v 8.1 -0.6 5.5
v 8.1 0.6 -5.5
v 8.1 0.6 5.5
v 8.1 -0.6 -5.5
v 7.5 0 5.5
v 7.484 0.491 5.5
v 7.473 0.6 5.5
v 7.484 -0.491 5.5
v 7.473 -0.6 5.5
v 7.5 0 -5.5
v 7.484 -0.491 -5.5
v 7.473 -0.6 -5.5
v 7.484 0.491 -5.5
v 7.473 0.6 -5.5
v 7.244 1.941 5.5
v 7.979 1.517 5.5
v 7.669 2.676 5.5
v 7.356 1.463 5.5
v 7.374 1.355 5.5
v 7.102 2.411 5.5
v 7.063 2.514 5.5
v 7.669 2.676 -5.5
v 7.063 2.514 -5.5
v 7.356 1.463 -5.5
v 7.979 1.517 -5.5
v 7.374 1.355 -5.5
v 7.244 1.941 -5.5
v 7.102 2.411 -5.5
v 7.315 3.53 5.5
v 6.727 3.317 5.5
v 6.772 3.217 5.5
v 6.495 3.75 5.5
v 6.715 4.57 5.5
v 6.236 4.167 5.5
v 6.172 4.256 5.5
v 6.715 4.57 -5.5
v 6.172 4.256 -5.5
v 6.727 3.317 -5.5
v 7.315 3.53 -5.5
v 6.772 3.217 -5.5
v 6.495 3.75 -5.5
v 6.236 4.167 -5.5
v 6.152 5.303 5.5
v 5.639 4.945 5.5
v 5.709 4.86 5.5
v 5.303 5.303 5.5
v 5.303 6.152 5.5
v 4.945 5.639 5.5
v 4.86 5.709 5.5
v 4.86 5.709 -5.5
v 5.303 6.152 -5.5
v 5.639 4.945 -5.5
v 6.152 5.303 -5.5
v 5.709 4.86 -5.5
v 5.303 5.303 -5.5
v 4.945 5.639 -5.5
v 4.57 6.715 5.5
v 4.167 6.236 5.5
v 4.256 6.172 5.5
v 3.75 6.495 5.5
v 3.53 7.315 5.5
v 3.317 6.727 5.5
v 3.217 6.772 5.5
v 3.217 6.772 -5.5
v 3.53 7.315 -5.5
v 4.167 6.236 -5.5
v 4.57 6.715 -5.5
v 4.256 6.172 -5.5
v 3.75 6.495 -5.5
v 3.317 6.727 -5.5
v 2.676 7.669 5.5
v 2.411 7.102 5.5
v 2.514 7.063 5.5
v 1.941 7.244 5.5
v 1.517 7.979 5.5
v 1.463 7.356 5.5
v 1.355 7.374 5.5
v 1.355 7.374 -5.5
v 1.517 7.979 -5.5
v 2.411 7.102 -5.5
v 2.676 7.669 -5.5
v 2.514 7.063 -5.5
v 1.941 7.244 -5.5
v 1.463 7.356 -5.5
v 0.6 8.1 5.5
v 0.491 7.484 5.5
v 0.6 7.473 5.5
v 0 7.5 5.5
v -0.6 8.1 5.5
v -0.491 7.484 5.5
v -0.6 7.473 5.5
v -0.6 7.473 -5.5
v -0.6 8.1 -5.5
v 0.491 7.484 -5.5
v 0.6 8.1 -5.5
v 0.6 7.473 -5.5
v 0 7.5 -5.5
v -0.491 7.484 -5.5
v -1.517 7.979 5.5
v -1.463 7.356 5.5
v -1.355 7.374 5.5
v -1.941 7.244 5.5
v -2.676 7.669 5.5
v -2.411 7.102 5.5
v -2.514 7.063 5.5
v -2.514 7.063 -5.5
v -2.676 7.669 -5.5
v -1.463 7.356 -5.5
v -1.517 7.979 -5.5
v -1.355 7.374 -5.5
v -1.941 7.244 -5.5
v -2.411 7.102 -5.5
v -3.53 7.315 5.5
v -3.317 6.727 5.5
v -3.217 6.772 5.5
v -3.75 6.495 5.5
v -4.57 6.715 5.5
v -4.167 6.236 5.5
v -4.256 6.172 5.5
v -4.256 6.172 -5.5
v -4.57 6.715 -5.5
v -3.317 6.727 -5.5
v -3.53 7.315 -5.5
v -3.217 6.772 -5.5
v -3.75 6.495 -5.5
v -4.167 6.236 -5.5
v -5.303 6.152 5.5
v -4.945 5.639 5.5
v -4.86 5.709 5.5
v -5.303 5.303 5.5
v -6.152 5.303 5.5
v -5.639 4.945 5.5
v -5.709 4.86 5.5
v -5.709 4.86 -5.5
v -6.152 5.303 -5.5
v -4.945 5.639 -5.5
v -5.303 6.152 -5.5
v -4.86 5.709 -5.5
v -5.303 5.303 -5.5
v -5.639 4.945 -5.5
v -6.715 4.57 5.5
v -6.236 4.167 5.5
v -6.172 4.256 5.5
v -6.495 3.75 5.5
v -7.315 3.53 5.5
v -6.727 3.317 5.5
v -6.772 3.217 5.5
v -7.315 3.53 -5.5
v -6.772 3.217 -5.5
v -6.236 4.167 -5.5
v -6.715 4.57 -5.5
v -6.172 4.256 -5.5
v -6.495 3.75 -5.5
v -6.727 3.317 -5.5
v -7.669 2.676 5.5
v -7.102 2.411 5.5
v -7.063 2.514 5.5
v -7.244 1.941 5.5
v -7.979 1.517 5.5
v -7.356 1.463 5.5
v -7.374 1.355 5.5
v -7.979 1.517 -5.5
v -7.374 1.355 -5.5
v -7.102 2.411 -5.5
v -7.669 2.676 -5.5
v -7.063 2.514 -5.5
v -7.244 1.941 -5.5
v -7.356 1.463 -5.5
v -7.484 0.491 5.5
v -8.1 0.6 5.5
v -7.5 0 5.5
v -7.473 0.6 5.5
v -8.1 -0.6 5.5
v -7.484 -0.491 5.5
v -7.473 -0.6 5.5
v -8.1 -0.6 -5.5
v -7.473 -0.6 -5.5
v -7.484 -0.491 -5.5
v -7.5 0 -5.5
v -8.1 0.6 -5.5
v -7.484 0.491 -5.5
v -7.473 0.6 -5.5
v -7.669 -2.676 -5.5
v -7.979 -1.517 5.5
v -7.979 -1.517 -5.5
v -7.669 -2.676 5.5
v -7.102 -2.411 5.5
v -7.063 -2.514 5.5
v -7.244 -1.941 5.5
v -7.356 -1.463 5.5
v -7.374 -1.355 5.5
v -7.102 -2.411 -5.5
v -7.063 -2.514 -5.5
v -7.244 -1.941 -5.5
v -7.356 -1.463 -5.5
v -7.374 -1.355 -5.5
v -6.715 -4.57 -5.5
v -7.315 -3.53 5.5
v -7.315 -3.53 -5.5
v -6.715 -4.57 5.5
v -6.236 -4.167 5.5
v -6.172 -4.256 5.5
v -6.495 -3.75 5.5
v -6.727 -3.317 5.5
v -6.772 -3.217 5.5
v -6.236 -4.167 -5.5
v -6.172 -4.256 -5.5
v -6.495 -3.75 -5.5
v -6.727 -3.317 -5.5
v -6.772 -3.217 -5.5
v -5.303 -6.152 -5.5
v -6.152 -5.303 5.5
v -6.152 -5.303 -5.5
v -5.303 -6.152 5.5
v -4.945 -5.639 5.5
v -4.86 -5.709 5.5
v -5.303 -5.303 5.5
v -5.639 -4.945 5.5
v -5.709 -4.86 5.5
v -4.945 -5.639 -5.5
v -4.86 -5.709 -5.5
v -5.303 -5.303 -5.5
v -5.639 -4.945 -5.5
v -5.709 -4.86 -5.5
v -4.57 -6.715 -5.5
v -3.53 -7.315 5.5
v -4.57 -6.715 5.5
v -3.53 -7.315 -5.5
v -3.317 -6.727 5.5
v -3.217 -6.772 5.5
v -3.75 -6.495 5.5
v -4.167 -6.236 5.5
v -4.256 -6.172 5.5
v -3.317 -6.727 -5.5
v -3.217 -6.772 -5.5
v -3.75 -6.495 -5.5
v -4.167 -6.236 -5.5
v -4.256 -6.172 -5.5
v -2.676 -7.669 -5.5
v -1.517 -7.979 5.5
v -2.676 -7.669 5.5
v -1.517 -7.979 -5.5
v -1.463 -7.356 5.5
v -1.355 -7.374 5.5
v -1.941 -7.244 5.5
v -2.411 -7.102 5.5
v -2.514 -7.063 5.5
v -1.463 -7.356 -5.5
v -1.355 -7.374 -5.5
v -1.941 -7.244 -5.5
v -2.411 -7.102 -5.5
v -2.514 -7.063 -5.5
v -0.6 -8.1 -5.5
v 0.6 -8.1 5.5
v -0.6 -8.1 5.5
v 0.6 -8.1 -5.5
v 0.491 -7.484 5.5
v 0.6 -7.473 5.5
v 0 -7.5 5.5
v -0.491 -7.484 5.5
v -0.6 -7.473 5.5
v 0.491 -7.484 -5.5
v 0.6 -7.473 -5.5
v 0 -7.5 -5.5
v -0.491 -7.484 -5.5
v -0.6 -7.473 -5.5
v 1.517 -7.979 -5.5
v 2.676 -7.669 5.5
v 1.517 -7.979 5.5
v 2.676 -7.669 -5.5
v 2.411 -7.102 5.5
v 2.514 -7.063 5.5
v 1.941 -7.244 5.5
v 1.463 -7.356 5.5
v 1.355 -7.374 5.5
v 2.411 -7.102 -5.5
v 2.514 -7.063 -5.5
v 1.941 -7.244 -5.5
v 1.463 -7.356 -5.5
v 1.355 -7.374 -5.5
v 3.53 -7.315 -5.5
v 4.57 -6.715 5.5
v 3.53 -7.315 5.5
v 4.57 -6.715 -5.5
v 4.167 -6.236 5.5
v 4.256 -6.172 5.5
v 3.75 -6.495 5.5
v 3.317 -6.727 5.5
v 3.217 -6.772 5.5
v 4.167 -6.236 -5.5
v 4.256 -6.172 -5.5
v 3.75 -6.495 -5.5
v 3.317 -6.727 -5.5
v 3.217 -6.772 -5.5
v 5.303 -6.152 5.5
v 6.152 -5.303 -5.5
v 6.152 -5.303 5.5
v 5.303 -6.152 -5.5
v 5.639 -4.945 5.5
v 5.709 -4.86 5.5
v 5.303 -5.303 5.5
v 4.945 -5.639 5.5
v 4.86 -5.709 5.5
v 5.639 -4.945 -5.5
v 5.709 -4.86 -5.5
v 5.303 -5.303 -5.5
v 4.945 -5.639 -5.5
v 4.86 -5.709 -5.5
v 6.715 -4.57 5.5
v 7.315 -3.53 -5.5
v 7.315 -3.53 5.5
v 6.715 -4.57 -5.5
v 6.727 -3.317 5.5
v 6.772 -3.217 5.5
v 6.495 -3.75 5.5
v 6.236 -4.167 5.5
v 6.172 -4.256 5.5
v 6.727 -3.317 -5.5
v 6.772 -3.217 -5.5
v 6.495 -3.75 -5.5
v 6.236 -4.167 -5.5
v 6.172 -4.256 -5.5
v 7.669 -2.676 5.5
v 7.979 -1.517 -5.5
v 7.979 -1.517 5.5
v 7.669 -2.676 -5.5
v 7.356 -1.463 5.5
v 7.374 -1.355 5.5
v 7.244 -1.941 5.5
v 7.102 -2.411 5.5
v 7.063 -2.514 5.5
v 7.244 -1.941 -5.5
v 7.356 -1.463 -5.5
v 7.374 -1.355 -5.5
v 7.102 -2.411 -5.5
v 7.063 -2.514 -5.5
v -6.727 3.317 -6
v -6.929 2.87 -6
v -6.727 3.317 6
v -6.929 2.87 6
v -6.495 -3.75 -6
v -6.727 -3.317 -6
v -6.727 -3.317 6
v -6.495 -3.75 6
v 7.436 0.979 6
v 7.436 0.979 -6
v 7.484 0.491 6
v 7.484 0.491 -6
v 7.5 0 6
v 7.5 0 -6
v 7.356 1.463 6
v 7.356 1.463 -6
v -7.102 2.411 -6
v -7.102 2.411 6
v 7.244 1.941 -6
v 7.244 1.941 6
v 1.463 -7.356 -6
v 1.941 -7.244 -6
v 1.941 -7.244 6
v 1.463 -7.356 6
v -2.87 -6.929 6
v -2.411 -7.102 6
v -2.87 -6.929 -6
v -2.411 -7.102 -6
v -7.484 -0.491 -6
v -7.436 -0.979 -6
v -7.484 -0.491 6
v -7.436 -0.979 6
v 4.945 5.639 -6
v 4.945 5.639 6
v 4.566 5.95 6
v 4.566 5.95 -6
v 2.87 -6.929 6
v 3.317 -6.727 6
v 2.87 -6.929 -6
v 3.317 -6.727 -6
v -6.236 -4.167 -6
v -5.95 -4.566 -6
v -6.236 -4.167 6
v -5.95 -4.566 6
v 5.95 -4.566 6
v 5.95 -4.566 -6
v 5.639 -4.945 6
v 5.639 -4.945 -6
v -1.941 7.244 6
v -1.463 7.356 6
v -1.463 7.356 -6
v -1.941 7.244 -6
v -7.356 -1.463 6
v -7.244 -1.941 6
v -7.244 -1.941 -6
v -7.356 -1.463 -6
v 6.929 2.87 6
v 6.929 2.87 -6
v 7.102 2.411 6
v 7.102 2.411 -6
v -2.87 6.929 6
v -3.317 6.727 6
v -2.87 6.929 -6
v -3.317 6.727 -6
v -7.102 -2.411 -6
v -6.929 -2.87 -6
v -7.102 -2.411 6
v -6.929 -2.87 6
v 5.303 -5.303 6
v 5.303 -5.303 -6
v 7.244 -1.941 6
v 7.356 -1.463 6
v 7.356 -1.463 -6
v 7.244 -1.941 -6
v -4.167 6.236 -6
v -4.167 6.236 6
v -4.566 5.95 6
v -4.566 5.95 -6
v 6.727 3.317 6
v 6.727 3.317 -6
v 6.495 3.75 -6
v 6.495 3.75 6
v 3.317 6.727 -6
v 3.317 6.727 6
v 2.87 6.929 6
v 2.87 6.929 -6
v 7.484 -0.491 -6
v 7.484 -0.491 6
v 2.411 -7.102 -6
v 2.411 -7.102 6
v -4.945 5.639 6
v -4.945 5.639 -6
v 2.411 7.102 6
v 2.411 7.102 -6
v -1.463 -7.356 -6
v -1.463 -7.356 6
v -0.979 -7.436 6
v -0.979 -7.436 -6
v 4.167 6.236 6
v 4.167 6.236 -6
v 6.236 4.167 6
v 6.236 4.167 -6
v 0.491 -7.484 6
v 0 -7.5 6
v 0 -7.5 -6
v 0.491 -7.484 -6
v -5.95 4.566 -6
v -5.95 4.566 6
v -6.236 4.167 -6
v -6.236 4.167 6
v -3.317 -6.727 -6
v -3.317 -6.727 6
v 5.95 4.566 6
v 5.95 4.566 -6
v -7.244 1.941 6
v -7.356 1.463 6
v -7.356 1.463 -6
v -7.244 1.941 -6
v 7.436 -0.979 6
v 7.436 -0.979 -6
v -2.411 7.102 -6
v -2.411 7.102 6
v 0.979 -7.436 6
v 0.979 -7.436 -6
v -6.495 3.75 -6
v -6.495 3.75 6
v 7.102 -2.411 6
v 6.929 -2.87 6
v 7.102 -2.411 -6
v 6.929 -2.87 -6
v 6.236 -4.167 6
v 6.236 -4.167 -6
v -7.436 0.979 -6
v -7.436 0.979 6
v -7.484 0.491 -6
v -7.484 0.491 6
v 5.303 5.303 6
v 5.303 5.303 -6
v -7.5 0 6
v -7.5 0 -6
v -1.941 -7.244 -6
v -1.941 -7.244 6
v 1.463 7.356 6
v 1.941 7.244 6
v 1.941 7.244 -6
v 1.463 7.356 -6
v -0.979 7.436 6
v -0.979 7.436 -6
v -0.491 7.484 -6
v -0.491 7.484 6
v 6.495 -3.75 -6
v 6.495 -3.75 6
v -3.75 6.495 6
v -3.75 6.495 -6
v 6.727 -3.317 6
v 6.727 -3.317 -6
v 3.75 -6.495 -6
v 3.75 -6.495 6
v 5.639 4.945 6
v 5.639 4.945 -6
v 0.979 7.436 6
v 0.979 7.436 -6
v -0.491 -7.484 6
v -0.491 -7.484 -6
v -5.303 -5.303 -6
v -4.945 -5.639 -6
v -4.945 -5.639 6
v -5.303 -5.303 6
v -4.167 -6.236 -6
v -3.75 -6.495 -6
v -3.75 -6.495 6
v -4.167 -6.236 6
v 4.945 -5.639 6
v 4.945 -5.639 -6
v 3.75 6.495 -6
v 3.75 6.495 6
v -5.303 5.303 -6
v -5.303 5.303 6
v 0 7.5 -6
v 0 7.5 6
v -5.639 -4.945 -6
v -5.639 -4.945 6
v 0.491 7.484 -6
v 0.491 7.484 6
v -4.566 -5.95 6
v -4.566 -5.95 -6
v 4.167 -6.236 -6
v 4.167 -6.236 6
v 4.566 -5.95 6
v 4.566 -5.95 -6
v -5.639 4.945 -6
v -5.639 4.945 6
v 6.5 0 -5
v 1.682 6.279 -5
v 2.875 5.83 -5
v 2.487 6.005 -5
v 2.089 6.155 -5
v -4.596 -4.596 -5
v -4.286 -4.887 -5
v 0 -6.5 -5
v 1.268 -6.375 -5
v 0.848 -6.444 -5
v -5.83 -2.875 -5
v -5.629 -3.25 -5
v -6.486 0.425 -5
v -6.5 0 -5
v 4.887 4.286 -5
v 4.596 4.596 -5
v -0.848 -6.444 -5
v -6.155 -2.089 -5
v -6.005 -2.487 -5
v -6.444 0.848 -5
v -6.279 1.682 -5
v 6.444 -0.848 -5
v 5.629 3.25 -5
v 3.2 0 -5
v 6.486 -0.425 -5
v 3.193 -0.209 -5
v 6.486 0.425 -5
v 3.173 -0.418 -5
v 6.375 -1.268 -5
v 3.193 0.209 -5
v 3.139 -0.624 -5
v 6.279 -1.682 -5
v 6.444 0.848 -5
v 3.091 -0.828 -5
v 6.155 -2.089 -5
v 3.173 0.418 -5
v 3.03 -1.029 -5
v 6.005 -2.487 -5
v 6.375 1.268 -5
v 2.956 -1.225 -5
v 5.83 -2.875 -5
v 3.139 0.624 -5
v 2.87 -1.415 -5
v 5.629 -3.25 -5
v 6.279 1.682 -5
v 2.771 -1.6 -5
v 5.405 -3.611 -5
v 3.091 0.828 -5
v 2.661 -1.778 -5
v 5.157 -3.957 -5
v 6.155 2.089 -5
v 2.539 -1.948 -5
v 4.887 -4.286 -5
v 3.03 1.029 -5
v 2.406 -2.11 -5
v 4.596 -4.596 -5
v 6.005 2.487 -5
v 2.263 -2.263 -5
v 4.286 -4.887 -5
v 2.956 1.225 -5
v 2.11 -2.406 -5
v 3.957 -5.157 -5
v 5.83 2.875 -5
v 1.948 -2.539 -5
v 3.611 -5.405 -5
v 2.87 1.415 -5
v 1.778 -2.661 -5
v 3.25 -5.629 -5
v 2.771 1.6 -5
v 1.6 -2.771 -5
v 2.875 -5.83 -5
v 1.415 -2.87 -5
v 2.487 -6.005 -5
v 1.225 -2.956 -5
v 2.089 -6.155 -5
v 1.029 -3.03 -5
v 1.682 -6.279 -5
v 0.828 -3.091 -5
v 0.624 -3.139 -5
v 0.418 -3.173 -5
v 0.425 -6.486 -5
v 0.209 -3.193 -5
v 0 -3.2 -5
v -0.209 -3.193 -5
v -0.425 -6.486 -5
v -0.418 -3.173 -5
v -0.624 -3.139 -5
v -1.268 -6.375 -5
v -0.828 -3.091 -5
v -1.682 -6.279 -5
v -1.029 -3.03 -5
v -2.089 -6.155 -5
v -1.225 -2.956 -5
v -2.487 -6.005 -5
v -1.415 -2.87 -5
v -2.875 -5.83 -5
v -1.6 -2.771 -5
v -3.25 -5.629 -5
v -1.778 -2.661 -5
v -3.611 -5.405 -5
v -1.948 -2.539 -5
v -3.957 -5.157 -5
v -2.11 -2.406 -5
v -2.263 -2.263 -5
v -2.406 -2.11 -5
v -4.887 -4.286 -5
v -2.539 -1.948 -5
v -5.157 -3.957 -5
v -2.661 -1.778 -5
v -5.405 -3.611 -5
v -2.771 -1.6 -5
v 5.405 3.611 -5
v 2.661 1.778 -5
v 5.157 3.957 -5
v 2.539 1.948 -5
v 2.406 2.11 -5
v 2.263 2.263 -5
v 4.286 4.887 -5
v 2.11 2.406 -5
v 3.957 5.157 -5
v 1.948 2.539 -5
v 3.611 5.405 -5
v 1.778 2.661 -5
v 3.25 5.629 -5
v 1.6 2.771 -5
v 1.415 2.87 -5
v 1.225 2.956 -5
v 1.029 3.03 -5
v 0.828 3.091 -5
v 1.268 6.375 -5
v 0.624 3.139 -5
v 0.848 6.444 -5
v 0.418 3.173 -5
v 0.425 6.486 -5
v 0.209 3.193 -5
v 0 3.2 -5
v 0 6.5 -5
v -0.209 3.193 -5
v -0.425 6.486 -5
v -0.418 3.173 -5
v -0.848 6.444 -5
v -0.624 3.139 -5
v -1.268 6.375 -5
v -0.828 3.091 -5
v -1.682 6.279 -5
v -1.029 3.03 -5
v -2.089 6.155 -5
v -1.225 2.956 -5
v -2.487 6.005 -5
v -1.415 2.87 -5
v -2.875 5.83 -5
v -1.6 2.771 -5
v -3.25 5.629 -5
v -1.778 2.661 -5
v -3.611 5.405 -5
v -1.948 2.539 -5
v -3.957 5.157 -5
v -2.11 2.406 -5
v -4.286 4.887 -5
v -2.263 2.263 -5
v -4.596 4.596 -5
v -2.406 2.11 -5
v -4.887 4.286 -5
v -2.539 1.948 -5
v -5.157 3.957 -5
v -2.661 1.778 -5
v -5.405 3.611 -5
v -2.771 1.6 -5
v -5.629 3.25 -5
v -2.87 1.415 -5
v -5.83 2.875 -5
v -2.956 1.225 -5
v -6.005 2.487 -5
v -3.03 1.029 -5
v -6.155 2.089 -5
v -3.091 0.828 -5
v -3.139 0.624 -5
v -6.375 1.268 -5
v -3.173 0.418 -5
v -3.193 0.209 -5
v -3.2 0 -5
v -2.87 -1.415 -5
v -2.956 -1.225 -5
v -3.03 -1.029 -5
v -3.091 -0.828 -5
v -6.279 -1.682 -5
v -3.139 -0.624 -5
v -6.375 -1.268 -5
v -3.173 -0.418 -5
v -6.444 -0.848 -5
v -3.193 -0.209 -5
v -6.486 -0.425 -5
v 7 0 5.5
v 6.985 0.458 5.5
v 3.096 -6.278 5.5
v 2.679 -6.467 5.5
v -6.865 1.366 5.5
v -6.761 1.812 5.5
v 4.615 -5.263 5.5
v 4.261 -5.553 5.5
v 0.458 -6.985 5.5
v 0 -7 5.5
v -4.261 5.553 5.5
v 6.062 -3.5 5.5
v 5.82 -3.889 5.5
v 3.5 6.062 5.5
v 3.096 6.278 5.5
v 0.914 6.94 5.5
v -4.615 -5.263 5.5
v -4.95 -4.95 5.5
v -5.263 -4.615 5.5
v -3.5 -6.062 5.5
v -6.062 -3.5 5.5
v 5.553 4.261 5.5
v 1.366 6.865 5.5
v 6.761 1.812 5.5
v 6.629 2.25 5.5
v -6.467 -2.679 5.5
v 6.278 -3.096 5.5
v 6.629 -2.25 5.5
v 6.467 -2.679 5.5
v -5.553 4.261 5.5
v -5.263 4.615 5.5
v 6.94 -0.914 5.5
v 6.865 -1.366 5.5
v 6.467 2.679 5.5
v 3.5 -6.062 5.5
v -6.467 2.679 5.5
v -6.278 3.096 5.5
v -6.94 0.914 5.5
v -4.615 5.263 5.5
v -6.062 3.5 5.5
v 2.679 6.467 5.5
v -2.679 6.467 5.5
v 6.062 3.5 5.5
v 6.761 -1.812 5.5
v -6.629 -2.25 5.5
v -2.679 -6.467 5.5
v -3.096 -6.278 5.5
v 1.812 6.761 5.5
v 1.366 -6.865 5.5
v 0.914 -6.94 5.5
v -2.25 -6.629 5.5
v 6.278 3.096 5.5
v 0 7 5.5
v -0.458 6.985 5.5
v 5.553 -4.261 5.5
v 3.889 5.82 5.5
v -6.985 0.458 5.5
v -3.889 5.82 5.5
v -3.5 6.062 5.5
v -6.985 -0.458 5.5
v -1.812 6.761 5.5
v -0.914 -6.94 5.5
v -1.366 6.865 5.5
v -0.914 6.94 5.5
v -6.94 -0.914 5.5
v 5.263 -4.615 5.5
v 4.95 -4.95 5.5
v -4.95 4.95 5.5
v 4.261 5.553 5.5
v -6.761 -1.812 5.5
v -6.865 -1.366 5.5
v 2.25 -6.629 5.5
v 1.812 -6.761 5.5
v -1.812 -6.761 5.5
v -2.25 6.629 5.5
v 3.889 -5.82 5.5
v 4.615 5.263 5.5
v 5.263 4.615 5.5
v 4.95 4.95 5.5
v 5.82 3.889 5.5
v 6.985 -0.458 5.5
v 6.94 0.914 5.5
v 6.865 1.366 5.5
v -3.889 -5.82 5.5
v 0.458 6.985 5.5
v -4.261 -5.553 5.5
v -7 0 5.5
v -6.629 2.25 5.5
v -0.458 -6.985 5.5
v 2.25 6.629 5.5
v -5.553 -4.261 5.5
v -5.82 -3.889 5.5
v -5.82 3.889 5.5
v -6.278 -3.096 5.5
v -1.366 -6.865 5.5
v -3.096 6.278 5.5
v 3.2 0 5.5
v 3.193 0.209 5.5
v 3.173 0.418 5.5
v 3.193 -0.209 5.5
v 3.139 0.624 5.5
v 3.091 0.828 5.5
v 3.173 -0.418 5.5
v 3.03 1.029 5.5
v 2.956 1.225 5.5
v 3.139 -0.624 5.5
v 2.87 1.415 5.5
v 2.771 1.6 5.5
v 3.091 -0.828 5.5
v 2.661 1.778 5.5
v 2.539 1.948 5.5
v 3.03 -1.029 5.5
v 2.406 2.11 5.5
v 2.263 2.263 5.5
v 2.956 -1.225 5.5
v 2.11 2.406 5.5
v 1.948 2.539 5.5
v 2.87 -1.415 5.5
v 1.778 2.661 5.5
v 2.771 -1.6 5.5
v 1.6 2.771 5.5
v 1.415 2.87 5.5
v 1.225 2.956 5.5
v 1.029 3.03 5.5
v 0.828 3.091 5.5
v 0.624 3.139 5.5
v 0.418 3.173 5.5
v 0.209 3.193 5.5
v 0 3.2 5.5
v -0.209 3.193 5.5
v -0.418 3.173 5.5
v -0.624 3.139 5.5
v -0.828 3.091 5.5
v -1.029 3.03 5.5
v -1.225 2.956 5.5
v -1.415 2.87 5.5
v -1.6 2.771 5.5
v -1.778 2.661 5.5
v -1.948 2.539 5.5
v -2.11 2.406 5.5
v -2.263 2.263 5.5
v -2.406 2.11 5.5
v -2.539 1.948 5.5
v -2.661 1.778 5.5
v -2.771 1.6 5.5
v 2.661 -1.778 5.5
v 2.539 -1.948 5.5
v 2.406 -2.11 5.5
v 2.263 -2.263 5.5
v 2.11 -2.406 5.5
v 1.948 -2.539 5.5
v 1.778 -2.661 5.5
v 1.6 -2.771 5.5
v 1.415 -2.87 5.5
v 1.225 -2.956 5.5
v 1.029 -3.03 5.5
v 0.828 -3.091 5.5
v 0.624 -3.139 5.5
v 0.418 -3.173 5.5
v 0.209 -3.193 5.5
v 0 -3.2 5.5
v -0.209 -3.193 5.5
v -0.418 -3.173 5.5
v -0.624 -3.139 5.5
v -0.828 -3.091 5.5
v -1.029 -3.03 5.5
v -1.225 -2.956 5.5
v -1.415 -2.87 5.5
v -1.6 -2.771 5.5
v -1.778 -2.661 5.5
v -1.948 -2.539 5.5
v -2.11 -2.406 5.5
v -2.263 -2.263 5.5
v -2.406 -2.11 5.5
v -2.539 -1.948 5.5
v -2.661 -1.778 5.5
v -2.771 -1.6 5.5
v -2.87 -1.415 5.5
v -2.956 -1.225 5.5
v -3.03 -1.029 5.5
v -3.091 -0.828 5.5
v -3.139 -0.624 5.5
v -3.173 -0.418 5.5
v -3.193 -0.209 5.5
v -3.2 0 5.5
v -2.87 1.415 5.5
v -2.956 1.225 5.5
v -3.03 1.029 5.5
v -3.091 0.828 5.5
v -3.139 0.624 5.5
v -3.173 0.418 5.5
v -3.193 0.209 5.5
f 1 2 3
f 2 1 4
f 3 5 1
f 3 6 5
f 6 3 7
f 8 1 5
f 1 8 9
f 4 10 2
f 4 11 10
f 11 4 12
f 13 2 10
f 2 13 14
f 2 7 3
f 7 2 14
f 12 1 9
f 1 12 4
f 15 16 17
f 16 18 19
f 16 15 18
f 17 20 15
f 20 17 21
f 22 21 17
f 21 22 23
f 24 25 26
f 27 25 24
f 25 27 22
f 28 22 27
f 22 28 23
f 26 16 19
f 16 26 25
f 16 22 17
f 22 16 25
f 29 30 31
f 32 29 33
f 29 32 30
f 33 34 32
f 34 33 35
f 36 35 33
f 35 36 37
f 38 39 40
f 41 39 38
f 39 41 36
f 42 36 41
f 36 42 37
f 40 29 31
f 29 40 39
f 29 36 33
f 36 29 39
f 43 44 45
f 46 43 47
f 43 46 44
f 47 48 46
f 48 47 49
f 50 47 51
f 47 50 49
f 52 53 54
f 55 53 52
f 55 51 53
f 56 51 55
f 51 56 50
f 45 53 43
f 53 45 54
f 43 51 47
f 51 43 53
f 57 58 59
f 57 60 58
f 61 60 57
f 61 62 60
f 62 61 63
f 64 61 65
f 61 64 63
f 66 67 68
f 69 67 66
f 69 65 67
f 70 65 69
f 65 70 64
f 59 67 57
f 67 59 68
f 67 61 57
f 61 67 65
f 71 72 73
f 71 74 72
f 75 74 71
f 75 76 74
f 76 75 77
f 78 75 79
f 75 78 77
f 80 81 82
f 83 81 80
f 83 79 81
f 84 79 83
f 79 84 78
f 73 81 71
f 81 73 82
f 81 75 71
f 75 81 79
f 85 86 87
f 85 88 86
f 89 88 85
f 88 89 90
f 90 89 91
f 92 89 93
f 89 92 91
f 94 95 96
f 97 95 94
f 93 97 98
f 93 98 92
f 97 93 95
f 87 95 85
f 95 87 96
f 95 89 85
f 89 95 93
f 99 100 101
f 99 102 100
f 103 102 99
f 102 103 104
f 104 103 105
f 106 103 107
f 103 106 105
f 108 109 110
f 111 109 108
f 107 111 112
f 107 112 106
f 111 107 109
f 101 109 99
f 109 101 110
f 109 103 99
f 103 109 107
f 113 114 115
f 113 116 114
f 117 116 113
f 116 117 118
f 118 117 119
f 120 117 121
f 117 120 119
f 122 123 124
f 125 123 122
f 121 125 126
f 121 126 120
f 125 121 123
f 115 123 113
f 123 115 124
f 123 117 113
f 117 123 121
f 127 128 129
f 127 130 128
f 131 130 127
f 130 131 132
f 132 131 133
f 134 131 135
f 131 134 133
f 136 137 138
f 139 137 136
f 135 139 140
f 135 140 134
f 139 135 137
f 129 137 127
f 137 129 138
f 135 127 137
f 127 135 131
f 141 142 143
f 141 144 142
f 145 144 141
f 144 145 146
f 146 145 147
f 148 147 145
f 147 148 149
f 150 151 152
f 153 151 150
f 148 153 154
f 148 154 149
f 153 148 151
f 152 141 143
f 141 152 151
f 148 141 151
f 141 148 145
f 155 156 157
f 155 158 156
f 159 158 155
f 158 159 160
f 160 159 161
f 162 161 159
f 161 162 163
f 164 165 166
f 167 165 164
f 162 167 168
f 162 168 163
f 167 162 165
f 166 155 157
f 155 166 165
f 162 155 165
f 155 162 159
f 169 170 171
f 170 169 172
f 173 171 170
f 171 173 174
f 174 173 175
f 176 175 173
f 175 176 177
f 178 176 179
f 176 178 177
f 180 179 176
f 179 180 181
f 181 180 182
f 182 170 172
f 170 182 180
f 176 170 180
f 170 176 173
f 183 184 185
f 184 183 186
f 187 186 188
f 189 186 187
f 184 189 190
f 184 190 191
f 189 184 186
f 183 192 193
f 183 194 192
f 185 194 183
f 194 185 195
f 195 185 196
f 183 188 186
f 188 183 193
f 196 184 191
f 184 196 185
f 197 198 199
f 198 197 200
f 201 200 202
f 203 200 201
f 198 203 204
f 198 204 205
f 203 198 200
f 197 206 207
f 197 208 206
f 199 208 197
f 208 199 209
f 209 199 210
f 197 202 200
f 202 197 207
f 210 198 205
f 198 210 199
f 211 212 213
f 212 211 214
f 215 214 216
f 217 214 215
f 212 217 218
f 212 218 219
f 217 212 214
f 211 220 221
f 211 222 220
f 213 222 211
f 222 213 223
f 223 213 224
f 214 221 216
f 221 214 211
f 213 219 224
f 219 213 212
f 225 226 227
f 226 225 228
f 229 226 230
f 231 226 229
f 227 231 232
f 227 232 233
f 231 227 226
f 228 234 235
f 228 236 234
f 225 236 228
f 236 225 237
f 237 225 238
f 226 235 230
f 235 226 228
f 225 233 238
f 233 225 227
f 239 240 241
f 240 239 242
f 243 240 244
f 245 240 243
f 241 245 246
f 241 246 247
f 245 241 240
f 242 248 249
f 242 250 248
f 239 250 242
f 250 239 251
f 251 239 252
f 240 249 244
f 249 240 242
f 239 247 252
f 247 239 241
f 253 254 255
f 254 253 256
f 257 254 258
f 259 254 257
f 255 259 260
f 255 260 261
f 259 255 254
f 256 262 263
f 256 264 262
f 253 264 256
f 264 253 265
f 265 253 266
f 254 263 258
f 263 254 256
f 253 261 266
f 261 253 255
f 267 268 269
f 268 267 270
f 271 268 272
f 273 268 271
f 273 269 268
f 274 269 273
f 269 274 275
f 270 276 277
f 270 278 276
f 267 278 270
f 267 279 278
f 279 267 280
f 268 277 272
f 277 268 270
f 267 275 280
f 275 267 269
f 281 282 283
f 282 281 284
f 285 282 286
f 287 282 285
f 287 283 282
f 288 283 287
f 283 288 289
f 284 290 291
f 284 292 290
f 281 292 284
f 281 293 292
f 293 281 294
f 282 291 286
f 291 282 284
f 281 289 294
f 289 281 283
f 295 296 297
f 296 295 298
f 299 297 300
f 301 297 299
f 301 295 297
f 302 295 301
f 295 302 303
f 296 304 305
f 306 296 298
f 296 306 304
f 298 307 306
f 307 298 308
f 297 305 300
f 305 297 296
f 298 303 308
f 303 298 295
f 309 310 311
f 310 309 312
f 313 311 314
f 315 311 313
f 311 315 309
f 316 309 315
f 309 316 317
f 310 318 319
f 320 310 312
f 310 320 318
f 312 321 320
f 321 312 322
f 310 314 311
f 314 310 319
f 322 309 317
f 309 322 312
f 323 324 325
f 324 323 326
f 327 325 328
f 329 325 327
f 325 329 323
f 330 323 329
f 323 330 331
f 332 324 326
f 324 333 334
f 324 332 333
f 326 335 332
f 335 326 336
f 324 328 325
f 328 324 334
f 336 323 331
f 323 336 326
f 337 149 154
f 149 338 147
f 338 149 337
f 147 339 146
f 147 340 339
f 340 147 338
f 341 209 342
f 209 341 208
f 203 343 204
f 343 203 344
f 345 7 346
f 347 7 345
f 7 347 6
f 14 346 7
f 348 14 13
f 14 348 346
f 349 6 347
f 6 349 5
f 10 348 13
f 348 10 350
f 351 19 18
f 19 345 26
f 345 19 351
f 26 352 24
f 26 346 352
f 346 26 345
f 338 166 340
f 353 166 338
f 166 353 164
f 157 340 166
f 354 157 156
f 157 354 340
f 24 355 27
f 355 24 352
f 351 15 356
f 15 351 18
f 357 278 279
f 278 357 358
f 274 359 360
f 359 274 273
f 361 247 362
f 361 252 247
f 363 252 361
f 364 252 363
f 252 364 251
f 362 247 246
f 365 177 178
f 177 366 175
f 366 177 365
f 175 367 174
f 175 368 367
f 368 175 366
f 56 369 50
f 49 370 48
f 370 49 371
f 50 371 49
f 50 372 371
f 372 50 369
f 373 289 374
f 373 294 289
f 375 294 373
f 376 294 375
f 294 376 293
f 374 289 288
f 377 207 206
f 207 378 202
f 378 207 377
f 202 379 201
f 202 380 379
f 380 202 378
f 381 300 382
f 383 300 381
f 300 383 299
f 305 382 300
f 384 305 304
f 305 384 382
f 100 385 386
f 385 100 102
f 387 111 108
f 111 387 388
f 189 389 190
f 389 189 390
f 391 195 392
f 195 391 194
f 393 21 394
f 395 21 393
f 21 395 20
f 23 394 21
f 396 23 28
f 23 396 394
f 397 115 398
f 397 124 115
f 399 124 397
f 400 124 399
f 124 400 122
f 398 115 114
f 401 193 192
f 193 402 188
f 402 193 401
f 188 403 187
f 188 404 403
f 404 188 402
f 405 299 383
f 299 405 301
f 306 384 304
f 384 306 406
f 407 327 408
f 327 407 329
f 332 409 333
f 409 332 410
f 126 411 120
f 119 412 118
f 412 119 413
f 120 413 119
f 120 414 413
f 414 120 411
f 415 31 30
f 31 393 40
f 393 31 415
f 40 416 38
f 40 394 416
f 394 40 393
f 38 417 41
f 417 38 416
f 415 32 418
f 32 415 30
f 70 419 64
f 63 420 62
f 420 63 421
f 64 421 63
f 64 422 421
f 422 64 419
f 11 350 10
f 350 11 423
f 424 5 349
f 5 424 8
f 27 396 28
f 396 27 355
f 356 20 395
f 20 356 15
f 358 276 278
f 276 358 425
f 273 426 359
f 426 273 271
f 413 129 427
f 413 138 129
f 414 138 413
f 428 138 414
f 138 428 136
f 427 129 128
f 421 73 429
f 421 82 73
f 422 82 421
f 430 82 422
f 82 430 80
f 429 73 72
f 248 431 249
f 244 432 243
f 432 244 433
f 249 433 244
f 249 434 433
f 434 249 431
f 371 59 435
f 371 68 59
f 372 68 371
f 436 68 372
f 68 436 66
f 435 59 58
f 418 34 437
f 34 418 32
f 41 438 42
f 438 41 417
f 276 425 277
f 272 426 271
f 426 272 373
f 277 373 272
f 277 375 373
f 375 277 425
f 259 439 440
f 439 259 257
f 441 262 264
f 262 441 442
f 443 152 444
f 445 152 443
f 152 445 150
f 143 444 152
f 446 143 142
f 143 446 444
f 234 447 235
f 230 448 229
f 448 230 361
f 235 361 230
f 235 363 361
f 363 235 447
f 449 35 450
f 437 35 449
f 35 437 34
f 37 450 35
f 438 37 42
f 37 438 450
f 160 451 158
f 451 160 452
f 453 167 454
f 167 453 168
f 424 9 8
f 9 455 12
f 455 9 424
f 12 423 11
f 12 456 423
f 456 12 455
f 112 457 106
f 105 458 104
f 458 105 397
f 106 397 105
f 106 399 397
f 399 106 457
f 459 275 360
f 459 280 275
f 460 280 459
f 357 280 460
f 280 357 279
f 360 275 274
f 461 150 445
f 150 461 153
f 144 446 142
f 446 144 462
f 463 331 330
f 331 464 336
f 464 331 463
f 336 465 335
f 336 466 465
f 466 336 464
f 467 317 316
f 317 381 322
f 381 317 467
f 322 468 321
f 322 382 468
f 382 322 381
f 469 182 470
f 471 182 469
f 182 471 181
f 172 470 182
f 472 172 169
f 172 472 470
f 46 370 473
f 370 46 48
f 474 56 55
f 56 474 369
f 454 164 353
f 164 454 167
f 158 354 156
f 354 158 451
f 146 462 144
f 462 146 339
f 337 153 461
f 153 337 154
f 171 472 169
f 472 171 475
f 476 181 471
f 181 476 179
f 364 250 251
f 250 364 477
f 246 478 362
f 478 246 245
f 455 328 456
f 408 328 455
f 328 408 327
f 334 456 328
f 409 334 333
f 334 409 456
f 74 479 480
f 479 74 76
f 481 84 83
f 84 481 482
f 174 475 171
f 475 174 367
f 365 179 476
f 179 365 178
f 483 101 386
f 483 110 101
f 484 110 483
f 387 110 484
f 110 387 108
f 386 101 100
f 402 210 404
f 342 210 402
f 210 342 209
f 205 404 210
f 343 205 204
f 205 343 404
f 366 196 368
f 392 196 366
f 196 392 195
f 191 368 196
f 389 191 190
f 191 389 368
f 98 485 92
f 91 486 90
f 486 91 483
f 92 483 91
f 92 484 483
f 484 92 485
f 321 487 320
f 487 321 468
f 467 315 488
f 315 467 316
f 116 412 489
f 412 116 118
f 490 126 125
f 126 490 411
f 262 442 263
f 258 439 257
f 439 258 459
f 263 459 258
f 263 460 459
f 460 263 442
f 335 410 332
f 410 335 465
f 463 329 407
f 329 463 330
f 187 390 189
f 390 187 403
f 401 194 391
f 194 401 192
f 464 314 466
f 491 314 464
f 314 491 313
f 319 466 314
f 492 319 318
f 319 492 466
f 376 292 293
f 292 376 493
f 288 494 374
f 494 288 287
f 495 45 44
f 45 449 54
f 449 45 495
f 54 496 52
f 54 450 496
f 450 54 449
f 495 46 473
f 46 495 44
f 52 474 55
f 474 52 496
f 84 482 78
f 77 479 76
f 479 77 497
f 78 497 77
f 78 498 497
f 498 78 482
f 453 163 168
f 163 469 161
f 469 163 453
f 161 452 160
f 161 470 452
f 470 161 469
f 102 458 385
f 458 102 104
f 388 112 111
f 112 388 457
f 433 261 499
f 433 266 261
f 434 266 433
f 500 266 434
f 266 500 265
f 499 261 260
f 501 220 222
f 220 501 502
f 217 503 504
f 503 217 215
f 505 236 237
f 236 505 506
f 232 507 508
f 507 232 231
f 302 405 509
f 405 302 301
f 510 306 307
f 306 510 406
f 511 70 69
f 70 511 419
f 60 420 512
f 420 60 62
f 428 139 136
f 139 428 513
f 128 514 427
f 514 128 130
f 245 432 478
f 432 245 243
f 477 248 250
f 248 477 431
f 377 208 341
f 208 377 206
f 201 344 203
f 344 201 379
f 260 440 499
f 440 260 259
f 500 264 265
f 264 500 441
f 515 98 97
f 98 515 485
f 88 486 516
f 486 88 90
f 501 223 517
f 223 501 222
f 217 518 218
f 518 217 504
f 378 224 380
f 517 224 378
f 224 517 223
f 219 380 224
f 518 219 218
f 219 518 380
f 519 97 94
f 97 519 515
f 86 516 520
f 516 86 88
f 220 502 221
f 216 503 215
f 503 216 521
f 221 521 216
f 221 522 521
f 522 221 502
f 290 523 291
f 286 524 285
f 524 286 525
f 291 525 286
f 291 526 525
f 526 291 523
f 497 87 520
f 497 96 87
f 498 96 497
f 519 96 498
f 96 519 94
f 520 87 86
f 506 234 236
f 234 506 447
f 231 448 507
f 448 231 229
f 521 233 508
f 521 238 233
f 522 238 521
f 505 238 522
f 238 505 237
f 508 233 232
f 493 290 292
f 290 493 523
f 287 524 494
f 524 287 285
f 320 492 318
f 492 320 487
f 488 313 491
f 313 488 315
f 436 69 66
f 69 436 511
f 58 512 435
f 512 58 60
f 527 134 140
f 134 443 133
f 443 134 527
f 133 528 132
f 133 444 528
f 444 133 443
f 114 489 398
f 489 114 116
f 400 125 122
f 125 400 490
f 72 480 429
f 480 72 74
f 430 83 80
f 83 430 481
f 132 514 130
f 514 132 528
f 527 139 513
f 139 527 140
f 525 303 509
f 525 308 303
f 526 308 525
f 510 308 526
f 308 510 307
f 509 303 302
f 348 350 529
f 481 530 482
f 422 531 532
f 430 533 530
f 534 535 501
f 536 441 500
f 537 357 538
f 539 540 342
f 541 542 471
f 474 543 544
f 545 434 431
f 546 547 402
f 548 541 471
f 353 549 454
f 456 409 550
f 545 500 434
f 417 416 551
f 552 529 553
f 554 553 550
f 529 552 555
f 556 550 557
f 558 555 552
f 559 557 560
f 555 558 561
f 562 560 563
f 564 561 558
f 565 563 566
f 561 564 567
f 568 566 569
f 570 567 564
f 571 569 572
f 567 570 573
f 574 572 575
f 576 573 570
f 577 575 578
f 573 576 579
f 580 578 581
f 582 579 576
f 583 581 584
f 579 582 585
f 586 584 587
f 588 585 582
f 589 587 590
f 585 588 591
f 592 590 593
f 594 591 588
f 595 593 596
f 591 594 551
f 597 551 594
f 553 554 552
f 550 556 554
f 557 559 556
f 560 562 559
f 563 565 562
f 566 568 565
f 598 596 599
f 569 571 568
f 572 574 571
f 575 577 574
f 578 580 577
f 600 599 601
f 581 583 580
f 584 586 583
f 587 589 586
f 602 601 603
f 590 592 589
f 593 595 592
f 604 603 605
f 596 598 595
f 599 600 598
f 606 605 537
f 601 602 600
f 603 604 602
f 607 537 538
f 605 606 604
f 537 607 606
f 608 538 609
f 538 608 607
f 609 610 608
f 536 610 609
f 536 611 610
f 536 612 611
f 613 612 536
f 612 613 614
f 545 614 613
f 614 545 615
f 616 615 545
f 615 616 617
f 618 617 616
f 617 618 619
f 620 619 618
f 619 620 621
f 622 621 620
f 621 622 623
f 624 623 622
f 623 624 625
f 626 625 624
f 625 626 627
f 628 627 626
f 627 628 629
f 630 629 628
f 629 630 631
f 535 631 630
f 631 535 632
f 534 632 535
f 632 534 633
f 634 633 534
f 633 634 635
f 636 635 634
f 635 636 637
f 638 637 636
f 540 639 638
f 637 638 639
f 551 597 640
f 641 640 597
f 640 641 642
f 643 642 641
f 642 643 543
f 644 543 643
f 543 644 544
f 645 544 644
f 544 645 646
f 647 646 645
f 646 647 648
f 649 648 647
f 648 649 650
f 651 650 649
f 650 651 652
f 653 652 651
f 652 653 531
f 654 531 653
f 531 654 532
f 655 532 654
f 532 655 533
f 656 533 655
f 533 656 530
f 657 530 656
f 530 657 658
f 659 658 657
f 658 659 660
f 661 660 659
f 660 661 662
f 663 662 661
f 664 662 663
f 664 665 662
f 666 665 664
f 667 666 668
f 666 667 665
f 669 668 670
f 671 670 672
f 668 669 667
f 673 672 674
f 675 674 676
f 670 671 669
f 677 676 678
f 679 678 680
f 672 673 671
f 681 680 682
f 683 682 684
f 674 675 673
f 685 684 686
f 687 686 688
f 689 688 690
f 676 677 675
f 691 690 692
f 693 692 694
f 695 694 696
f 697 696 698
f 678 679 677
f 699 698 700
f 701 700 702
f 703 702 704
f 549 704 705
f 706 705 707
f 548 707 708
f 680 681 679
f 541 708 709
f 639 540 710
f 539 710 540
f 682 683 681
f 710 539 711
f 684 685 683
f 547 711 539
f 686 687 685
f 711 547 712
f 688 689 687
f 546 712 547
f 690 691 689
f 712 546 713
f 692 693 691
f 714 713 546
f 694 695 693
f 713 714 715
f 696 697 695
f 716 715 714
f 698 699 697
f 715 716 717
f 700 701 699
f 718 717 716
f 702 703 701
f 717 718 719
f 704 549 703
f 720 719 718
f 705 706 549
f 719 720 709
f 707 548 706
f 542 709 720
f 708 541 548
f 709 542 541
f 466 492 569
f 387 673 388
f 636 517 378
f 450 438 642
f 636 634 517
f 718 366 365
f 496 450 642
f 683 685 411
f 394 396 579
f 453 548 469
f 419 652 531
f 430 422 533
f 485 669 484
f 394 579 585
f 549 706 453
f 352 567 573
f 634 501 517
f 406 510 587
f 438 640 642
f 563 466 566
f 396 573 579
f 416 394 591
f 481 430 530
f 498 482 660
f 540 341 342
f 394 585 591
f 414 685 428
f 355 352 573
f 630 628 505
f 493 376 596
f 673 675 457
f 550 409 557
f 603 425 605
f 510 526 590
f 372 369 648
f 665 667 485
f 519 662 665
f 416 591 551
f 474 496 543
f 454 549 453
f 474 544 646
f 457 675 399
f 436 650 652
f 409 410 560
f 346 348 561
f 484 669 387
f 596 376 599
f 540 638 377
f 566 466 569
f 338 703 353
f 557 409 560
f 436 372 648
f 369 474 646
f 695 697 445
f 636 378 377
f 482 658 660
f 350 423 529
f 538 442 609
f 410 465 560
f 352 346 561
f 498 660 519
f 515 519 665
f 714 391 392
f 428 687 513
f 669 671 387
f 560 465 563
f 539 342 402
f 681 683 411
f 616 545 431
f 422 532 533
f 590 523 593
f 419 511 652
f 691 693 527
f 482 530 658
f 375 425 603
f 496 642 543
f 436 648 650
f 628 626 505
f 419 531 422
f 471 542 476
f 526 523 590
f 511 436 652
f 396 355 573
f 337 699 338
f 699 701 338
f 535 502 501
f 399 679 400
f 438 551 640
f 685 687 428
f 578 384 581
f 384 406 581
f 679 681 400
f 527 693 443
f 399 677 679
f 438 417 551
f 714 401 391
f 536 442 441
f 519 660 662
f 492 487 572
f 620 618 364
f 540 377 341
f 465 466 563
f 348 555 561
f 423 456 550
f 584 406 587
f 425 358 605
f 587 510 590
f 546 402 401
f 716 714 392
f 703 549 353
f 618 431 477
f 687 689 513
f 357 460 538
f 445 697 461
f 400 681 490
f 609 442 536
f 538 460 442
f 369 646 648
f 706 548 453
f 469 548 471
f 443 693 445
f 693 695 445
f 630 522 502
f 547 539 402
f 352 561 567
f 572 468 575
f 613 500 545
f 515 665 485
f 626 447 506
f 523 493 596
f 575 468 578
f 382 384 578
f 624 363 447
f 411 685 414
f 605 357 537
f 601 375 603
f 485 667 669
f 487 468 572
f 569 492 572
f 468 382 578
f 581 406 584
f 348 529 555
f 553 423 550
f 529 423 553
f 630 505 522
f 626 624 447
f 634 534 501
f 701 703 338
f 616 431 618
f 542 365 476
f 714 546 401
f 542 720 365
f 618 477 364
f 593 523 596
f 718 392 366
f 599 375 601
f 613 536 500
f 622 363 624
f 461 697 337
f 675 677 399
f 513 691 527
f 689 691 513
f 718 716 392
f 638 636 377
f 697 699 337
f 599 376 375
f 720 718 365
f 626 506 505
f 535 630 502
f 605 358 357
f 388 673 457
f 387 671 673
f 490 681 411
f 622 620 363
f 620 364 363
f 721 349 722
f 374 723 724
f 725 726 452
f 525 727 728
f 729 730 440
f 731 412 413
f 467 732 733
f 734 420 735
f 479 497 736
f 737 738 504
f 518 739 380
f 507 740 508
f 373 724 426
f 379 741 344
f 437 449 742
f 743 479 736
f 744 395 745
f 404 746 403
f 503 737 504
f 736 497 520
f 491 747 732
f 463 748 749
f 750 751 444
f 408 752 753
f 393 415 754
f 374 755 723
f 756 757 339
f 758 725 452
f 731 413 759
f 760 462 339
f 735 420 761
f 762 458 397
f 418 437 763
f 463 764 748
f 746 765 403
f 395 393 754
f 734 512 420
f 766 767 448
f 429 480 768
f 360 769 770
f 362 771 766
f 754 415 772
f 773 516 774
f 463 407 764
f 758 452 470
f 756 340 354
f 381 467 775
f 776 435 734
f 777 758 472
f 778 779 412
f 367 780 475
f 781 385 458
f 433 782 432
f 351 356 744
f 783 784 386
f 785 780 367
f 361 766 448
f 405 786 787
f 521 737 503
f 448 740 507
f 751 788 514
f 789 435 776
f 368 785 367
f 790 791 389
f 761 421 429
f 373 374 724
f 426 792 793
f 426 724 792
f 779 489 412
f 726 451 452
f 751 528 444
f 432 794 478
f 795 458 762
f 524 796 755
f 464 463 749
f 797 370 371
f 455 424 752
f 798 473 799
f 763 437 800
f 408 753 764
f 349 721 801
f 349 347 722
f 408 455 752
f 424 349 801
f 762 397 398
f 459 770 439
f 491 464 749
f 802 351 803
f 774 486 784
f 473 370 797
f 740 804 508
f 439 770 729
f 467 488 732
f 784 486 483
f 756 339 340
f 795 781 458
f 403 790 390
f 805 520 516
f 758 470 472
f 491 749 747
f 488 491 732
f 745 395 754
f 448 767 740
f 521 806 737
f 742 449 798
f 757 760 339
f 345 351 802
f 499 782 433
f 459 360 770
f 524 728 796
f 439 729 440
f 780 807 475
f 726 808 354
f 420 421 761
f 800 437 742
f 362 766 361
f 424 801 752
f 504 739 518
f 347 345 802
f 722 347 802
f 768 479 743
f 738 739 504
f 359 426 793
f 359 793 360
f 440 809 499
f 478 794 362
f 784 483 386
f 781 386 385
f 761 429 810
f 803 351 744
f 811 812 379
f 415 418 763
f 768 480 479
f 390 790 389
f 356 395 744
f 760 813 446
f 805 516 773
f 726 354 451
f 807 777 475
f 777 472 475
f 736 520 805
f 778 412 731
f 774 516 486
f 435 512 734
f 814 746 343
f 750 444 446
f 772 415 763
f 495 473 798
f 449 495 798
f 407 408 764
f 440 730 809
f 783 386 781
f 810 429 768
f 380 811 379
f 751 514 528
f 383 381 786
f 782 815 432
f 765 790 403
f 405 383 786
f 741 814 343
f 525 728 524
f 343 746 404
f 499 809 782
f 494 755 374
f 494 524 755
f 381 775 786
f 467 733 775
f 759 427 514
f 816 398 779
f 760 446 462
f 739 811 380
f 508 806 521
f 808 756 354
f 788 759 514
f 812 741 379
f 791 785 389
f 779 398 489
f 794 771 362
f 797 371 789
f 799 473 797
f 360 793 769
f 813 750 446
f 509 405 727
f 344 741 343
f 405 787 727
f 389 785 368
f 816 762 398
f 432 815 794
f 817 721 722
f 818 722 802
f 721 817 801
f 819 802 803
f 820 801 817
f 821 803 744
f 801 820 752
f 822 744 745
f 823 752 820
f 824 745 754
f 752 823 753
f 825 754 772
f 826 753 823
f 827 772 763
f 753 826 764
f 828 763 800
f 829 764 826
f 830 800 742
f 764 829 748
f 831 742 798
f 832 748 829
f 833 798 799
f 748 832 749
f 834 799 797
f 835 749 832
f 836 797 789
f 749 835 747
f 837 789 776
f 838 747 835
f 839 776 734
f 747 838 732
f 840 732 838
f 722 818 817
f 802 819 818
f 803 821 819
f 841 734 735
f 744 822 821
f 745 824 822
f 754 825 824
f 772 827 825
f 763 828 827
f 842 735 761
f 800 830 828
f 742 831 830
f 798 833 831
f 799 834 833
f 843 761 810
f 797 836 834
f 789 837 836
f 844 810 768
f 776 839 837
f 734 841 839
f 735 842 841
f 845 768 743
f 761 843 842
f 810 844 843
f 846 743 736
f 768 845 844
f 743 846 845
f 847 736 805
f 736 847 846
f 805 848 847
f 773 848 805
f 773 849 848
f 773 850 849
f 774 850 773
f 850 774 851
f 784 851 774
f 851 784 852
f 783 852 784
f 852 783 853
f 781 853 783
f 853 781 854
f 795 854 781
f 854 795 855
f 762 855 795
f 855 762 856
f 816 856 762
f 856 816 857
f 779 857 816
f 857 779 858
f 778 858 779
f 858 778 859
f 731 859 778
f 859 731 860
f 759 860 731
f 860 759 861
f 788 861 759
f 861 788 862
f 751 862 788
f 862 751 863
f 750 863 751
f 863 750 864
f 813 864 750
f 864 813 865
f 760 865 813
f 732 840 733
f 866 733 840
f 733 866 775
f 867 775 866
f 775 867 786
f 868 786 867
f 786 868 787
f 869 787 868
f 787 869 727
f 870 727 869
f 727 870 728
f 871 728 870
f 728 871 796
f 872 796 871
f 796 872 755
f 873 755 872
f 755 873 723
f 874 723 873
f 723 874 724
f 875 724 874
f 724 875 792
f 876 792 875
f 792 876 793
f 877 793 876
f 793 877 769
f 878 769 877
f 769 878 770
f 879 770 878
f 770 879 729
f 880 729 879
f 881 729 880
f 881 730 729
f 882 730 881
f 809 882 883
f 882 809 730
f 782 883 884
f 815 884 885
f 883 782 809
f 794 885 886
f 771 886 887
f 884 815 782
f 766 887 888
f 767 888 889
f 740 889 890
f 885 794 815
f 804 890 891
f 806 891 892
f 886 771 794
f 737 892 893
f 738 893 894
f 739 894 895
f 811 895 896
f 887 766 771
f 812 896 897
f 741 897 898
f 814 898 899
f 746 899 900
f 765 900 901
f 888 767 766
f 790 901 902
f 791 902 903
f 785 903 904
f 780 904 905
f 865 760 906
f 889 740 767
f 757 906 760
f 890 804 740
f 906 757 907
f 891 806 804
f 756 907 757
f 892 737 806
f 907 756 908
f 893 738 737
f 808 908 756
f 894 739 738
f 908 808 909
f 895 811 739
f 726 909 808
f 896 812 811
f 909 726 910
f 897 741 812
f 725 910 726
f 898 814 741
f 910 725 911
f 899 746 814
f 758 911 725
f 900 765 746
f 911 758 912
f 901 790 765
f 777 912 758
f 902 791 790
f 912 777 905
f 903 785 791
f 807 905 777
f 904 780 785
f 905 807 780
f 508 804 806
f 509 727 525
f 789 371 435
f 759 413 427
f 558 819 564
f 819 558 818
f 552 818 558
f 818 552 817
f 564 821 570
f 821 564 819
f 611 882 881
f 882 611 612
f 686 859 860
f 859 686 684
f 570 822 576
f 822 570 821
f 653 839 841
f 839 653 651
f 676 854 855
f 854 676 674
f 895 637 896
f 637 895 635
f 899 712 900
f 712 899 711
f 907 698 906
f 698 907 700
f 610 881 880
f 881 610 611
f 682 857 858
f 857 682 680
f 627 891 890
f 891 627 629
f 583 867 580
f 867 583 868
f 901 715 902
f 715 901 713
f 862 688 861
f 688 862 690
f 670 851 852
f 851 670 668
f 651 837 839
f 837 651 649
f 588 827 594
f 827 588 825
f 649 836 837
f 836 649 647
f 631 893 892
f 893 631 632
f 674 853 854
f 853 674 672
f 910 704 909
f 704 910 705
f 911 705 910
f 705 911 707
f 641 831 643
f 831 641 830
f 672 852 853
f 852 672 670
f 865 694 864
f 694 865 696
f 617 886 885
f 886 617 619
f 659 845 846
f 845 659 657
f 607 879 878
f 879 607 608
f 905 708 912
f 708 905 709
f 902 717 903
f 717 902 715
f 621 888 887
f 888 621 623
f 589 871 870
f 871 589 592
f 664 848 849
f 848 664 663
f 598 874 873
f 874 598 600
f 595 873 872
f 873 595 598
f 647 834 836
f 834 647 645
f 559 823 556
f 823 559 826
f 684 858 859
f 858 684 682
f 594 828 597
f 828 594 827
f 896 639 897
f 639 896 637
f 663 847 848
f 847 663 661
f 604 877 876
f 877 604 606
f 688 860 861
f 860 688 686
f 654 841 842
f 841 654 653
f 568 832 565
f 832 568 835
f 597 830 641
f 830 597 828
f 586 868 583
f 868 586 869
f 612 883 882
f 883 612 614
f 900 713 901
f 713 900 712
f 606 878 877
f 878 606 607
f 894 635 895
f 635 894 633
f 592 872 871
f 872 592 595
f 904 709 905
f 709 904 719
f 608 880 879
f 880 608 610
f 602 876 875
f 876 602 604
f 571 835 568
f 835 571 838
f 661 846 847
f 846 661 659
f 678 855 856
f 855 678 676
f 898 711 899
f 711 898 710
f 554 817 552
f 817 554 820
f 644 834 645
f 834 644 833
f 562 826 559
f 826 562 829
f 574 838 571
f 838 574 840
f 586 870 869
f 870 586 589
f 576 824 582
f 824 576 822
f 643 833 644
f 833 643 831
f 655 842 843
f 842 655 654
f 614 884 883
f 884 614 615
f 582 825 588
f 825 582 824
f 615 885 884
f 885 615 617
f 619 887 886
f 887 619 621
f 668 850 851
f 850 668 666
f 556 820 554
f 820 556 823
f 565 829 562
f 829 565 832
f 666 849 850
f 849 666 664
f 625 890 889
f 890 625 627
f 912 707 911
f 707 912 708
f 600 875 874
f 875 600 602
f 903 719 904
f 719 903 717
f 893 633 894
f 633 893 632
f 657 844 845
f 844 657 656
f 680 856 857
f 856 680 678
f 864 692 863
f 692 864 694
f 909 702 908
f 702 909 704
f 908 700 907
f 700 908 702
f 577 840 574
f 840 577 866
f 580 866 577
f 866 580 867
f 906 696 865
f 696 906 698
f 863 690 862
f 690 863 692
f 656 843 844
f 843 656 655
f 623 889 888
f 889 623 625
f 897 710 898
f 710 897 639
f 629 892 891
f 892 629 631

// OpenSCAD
// Threaded heat-set insert (simplified) — 15mm OD, 12mm long, for 6mm screws

// Parameters
outer_diameter = 15; //[7.5:30:0.1]
length = 12; //[6:24:0.1]
screw_diameter = 6; //[3:12:0.1]
inner_thread_clearance = 0.4; //[0.1:1:0.05]

lead_in_chamfer_height = 1; //[0.5:2:0.1]
installation_end_chamfer_height = 0.5; //[0.2:1.5:0.1]

retention_rib_count = 24; //[8:60:1]
retention_rib_depth = 0.6; //[0.2:1.5:0.05]
retention_rib_width = 1.2; //[0.5:3:0.05]
retention_rib_z_margin = 0.5; //[0.2:2:0.1]

overlap = 0.8; //[0.2:2:0.1]
$fn = 96;

// Threaded Insert - complete geometry
module threaded_insert() {
  outer_r = outer_diameter/2;
  inner_r = (screw_diameter + inner_thread_clearance)/2;

  // Keep ribs fully within the insert length so everything is one connected solid
  rib_len = max(0.01, length - 2*retention_rib_z_margin);

  // Place ribs so they overlap into the body by "overlap" (prevents floating / non-manifold)
  rib_center_r = outer_r + retention_rib_depth/2 - overlap;

  // Chamfer radial reduction (simple, stable)
  lead_reduction = min(lead_in_chamfer_height, outer_r - 0.01);
  inst_reduction = min(installation_end_chamfer_height, outer_r - 0.01);

  color([0.8, 0.6, 0.2])  // Brass-like
  difference() {
    union() {
      // Main body
      cylinder(r=outer_r, h=length, center=true);

      // Retention ribs (knurl-like)
      for (i = [0:retention_rib_count-1]) {
        rotate([0, 0, i*360/retention_rib_count])
          translate([rib_center_r, 0, 0])
            cube([retention_rib_depth + 2*overlap, retention_rib_width, rib_len], center=true);
      }
    }

    // Lead-in chamfer (subtract)
    translate([0, 0, -length/2 + lead_in_chamfer_height/2])
      cylinder(r1=outer_r, r2=outer_r - lead_reduction, h=lead_in_chamfer_height, center=true);

    // Installation end chamfer (subtract)
    translate([0, 0,  length/2 - installation_end_chamfer_height/2])
      cylinder(r1=outer_r - inst_reduction, r2=outer_r, h=installation_end_chamfer_height, center=true);

    // Internal clearance hole
    cylinder(r=inner_r, h=length + 2*overlap, center=true);
  }
}

threaded_insert();
